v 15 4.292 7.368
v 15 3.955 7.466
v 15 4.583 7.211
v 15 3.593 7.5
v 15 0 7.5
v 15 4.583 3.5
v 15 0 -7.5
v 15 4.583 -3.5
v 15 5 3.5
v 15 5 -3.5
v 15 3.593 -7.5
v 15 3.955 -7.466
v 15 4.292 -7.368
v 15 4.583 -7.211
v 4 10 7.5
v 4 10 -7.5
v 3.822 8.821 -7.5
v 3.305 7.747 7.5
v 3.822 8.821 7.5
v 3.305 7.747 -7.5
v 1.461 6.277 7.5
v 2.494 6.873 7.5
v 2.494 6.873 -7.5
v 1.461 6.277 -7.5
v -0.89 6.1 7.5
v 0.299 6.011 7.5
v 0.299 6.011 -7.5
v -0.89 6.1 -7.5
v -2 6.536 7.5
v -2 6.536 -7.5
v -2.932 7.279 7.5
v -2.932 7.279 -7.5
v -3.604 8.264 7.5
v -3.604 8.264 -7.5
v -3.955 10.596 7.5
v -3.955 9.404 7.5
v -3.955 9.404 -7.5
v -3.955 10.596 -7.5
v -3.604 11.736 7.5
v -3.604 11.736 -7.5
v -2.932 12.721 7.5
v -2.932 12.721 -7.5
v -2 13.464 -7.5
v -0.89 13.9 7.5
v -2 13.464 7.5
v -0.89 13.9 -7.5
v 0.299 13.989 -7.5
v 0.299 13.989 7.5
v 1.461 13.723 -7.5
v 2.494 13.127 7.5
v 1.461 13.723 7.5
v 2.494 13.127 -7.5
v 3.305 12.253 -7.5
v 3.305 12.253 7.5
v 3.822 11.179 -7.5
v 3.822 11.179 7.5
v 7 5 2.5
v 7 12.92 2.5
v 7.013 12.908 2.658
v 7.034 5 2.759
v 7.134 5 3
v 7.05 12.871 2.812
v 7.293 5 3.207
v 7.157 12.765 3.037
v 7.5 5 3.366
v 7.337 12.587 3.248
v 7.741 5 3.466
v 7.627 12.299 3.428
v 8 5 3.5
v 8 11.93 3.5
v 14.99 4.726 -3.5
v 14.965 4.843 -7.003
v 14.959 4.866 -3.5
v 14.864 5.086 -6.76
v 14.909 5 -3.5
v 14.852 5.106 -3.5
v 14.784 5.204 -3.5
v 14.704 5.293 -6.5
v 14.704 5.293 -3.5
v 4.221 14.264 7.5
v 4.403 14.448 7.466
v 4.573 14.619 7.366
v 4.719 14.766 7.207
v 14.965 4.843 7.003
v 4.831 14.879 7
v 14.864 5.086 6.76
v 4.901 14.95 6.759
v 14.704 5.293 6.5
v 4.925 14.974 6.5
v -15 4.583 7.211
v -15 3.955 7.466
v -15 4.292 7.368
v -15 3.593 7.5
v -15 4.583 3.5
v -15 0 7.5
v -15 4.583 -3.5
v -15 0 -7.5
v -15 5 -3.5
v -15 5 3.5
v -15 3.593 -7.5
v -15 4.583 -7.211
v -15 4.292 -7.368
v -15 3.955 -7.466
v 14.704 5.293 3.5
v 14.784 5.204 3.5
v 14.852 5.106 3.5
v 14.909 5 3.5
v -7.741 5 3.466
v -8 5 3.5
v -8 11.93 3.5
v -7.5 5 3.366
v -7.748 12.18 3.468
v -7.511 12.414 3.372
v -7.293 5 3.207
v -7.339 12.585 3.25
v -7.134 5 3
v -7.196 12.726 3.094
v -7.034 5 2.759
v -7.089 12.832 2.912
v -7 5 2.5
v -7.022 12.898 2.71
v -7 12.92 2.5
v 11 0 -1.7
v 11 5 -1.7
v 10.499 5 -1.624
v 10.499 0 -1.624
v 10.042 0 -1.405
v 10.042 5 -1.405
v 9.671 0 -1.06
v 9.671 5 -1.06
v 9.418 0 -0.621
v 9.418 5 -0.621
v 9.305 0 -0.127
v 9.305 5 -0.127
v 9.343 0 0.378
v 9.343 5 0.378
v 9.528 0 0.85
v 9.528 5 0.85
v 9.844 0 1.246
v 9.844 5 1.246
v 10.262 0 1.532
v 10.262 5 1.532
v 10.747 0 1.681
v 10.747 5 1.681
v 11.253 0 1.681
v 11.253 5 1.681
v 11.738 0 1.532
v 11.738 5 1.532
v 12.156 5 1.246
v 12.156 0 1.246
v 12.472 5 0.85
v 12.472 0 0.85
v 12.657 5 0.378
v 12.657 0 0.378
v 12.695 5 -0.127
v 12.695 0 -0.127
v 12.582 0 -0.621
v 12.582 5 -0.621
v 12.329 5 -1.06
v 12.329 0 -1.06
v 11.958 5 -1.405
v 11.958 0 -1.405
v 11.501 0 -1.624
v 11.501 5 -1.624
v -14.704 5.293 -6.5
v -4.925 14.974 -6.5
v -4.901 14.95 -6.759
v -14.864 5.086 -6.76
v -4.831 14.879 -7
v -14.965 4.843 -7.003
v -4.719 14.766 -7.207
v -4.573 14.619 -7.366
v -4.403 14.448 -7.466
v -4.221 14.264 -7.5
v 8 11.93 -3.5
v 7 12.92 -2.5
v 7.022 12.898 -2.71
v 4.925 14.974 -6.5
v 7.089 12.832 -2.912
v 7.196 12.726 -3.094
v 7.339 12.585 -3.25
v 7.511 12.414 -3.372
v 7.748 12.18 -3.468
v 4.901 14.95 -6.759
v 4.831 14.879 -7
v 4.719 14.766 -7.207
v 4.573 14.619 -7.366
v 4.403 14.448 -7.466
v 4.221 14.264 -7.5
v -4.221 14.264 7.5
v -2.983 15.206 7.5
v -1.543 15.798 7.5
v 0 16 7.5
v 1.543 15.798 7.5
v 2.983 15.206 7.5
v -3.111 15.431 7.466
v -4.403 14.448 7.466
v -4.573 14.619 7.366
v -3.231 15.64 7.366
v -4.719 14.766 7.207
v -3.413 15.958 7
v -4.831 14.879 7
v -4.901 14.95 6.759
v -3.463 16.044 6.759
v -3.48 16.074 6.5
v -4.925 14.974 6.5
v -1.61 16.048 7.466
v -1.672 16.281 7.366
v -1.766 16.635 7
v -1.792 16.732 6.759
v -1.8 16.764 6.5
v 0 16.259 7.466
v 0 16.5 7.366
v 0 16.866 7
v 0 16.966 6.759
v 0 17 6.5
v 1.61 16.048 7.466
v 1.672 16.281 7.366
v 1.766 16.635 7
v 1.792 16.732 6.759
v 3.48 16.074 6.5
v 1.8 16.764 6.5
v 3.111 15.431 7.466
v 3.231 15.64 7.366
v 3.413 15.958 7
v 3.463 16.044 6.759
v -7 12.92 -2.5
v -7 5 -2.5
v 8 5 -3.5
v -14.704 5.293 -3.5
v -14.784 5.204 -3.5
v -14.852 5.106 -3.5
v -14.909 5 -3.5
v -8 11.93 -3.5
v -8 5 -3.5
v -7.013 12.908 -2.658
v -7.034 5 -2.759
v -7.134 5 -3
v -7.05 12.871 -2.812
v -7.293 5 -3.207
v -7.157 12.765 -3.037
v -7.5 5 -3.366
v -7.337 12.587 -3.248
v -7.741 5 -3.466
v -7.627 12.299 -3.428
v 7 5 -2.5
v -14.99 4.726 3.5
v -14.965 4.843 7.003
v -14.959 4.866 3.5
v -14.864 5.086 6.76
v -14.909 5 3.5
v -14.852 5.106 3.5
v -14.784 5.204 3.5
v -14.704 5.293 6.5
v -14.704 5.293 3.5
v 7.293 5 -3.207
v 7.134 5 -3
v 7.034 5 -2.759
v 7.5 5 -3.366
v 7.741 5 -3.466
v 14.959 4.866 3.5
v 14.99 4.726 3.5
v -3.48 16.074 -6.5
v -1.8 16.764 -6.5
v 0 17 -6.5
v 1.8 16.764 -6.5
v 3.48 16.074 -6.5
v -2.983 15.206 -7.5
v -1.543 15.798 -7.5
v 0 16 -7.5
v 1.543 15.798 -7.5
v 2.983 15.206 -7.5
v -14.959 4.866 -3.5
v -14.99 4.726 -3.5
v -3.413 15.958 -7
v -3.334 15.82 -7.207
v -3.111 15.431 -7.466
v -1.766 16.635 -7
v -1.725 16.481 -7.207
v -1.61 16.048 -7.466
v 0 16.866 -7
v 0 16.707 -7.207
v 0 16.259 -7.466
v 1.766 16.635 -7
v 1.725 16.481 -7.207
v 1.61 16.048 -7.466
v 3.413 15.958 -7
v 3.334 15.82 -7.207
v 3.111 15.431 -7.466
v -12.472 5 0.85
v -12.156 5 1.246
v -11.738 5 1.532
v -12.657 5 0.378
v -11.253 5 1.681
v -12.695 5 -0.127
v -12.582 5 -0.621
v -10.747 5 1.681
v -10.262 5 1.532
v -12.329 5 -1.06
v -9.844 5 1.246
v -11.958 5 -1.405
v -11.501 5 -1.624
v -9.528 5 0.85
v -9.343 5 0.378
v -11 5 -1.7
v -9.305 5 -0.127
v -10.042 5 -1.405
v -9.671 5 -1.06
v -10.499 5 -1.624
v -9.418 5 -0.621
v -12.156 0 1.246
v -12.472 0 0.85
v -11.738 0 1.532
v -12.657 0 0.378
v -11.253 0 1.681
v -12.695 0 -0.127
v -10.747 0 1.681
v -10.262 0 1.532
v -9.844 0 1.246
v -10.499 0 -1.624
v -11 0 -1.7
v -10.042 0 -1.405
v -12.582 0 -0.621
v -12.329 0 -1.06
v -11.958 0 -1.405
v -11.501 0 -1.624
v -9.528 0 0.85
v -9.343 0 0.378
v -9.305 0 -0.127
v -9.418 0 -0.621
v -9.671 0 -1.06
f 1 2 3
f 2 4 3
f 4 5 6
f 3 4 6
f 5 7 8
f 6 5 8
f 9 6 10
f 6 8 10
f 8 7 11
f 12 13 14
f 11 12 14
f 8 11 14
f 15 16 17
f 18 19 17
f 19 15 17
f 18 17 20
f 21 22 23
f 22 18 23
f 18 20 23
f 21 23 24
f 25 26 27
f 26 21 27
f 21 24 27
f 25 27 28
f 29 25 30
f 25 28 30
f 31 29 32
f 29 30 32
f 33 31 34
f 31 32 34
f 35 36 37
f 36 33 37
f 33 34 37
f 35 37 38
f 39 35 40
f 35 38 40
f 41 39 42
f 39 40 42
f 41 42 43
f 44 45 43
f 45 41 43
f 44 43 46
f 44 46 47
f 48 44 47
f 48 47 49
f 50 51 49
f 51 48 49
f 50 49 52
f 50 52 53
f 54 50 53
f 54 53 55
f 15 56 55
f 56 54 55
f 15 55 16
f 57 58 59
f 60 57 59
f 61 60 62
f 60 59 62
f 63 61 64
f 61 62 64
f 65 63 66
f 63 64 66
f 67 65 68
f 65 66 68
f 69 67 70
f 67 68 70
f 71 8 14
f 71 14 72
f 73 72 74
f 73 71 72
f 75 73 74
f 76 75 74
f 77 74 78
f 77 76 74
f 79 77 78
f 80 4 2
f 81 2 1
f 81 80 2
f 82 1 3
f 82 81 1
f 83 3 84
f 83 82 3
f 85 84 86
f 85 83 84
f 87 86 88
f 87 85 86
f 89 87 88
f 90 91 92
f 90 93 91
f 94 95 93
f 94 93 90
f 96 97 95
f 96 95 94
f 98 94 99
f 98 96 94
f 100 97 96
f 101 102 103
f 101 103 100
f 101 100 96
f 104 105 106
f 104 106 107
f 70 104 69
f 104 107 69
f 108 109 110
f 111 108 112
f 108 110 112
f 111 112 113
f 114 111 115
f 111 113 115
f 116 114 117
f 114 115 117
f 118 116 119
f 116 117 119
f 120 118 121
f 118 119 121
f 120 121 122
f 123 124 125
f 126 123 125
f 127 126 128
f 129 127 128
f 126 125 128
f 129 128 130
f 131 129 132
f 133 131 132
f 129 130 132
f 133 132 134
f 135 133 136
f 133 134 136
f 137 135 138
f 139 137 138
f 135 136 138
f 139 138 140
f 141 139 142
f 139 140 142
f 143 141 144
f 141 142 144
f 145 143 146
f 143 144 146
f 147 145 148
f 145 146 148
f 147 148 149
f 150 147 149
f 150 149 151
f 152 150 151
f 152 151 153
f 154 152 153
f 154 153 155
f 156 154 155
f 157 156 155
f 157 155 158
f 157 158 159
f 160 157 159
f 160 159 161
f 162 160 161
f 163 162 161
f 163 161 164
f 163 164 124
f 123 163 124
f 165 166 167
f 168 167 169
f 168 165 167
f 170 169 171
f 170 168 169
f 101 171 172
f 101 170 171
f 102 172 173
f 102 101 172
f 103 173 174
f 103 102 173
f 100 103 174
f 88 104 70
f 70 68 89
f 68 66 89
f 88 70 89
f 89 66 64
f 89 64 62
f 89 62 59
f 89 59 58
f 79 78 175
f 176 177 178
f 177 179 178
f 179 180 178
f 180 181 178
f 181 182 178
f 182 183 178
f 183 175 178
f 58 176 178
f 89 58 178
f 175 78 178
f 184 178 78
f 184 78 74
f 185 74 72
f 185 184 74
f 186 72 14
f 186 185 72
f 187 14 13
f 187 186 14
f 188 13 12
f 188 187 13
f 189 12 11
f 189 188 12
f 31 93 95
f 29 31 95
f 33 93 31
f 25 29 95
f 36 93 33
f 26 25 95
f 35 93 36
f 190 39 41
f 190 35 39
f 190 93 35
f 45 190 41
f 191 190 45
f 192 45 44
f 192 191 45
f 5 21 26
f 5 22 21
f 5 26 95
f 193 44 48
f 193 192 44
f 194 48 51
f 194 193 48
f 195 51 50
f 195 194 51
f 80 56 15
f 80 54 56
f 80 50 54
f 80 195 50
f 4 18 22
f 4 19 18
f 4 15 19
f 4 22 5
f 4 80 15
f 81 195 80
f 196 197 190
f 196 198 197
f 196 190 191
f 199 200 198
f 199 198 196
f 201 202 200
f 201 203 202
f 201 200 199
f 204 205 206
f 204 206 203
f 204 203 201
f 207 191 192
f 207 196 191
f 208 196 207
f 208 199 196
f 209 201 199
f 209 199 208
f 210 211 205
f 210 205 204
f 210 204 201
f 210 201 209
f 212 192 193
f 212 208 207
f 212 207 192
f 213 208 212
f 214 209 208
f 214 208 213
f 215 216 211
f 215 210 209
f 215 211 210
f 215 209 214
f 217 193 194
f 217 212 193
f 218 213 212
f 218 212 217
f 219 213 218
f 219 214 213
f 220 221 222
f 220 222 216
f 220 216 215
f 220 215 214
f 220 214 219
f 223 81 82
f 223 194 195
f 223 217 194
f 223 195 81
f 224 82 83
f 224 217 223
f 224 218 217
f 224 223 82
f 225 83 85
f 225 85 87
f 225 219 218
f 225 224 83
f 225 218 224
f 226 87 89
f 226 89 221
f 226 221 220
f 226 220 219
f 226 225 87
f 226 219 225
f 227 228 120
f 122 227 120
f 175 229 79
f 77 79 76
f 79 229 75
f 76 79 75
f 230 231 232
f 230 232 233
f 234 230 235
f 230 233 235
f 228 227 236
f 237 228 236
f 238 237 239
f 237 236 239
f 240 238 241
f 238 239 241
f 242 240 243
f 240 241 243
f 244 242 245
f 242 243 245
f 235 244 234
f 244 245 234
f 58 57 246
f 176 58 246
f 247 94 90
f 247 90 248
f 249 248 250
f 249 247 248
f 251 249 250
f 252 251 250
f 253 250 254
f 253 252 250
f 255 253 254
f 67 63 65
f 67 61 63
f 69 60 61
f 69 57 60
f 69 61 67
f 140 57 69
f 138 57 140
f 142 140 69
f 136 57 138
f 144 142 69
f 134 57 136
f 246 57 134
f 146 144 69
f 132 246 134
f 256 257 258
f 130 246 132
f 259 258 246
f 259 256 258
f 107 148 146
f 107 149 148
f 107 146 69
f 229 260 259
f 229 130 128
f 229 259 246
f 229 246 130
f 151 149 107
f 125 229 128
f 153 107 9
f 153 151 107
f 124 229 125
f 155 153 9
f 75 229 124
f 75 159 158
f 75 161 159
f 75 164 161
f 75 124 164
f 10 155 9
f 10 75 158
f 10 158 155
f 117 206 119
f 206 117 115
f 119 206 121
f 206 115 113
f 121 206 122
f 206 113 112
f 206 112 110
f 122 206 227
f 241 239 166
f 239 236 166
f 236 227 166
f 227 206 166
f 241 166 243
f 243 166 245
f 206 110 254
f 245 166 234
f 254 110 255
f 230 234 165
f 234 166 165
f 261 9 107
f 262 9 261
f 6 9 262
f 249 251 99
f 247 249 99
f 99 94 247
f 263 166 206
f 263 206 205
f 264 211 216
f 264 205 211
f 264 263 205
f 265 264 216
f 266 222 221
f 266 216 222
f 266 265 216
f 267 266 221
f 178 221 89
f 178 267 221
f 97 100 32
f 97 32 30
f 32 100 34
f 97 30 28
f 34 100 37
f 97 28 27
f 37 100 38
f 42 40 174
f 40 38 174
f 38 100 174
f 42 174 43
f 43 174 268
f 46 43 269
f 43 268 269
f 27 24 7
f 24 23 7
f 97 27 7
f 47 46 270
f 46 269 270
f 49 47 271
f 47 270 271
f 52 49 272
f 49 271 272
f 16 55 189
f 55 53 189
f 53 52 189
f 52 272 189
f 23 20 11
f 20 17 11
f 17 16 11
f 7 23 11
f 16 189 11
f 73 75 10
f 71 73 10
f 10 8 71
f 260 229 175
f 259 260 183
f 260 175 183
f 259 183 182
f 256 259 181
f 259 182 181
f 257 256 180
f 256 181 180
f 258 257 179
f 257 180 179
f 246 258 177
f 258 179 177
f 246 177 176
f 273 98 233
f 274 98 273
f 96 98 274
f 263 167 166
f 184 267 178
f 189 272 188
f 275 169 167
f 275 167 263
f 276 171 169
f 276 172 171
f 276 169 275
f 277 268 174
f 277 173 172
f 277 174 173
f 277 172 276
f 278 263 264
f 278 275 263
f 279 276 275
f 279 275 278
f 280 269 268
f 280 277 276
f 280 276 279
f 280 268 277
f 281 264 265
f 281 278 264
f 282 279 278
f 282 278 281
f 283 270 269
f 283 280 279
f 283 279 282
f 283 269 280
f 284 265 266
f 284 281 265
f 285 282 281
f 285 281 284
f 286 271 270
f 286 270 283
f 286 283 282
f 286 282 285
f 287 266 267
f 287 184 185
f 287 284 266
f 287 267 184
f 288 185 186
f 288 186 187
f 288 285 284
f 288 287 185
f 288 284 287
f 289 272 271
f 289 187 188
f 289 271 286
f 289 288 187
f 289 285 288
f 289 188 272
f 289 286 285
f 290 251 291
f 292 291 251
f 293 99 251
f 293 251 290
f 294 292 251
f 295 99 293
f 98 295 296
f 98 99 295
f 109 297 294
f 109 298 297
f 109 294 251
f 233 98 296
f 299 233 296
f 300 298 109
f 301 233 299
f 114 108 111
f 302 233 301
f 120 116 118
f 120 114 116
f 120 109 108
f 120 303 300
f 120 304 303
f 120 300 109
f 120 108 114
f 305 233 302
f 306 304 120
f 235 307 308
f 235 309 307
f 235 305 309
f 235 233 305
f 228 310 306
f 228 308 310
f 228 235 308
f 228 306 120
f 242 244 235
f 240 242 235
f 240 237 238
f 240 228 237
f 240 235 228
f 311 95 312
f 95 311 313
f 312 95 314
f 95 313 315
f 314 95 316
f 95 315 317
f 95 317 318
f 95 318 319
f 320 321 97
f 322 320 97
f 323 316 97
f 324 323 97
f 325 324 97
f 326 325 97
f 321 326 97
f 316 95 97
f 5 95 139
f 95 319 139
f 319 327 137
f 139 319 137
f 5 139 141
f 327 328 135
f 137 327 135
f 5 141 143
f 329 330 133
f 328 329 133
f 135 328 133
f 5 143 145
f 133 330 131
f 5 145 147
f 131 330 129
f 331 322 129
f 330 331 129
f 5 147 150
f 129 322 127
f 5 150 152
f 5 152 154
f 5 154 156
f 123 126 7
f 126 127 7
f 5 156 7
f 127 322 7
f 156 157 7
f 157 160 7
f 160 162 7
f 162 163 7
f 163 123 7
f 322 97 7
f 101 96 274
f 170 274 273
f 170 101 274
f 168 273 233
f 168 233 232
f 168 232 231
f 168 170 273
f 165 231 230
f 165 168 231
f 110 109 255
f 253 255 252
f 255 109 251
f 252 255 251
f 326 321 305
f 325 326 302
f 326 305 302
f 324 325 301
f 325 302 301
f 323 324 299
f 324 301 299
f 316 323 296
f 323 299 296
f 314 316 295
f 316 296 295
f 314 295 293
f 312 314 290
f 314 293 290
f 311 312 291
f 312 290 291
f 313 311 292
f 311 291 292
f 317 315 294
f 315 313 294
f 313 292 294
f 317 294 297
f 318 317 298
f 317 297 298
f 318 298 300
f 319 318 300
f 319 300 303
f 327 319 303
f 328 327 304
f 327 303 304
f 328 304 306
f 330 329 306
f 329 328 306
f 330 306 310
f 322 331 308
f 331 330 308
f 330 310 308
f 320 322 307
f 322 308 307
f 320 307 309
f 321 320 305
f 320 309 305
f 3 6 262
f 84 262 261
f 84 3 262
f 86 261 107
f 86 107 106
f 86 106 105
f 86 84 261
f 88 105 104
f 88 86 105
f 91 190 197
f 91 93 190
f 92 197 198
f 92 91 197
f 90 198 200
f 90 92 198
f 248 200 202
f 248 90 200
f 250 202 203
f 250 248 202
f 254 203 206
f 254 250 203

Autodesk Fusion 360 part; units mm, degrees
sketch "Sketch1" plane through (0, 0, 0) normal (0, 0, 1) x (1, 0, 0)
  line L0 (-15, 0) -> (15, 0)
  line L1 (15, 5) -> (4.9248, 14.9745)
  line L2 (-4.9248, 14.9745) -> (-15, 5)
  circle A0 centre (0, 10) radius 4
  line L3 (0, 2.5) -> (0, 20) construction
  arc A1 (4.9248, 14.9745) -> (-4.9248, 14.9745) centre (0, 10) ccw
  line L4 (15, 0) -> (15, 5)
  line L5 (-15, 0) -> (-15, 1)
  line L6 (-15, 1) -> (-15, 5)
  dimension "d1" = 8
  dimension "d2" = 7
  dimension "d3" = 10
  dimension "d4" = 30
  dimension "d5" = 5
extrude "Extrude1" add sketch "Sketch1" along normal mid plane 15
sketch "Sketch2" plane through (0, 0, 0) normal (0, 1, 0) x (1, 0, 0)
  line L0 (7, 3.5) -> (15, 3.5)
  line L1 (15, 3.5) -> (15, -3.5)
  line L2 (15, -3.5) -> (7, -3.5)
  line L3 (7, -3.5) -> (7, 3.5)
  line L4 (1.75, 0) -> (22.5, 0) construction
  line L5 (15, 7.5) -> (15, -7.5)
  point P0 (11, 0)
  dimension "d8" = 7
  dimension "d9" = 7
  dimension "d12" = 4
extrude "Extrude2" cut sketch "Sketch2" along normal through all from surface at 5
hole "Hole1" at (11, 0, 0) direction (0, 1, 0) diameter 3.4 end through all
mirror "Mirror1" about plane through (0, 0, 0) normal (1, 0, 0) of "Hole1", "Extrude2"
fillet "Fillet1" radius 1 14 edges at (7, 8.96, -3.5) (7, 8.96, 3.5) (-7, 8.96, -3.5) (-7, 8.96, 3.5) (9.9624, 9.9873, 7.5) (0, 17, 7.5) (-9.9624, 9.9873, 7.5) (-9.9624, 9.9873, -7.5) (0, 17, -7.5) (9.9624, 9.9873, -7.5) (15, 5, 5.5) (15, 5, -5.5) (-15, 5, -5.5) (-15, 5, 5.5)
